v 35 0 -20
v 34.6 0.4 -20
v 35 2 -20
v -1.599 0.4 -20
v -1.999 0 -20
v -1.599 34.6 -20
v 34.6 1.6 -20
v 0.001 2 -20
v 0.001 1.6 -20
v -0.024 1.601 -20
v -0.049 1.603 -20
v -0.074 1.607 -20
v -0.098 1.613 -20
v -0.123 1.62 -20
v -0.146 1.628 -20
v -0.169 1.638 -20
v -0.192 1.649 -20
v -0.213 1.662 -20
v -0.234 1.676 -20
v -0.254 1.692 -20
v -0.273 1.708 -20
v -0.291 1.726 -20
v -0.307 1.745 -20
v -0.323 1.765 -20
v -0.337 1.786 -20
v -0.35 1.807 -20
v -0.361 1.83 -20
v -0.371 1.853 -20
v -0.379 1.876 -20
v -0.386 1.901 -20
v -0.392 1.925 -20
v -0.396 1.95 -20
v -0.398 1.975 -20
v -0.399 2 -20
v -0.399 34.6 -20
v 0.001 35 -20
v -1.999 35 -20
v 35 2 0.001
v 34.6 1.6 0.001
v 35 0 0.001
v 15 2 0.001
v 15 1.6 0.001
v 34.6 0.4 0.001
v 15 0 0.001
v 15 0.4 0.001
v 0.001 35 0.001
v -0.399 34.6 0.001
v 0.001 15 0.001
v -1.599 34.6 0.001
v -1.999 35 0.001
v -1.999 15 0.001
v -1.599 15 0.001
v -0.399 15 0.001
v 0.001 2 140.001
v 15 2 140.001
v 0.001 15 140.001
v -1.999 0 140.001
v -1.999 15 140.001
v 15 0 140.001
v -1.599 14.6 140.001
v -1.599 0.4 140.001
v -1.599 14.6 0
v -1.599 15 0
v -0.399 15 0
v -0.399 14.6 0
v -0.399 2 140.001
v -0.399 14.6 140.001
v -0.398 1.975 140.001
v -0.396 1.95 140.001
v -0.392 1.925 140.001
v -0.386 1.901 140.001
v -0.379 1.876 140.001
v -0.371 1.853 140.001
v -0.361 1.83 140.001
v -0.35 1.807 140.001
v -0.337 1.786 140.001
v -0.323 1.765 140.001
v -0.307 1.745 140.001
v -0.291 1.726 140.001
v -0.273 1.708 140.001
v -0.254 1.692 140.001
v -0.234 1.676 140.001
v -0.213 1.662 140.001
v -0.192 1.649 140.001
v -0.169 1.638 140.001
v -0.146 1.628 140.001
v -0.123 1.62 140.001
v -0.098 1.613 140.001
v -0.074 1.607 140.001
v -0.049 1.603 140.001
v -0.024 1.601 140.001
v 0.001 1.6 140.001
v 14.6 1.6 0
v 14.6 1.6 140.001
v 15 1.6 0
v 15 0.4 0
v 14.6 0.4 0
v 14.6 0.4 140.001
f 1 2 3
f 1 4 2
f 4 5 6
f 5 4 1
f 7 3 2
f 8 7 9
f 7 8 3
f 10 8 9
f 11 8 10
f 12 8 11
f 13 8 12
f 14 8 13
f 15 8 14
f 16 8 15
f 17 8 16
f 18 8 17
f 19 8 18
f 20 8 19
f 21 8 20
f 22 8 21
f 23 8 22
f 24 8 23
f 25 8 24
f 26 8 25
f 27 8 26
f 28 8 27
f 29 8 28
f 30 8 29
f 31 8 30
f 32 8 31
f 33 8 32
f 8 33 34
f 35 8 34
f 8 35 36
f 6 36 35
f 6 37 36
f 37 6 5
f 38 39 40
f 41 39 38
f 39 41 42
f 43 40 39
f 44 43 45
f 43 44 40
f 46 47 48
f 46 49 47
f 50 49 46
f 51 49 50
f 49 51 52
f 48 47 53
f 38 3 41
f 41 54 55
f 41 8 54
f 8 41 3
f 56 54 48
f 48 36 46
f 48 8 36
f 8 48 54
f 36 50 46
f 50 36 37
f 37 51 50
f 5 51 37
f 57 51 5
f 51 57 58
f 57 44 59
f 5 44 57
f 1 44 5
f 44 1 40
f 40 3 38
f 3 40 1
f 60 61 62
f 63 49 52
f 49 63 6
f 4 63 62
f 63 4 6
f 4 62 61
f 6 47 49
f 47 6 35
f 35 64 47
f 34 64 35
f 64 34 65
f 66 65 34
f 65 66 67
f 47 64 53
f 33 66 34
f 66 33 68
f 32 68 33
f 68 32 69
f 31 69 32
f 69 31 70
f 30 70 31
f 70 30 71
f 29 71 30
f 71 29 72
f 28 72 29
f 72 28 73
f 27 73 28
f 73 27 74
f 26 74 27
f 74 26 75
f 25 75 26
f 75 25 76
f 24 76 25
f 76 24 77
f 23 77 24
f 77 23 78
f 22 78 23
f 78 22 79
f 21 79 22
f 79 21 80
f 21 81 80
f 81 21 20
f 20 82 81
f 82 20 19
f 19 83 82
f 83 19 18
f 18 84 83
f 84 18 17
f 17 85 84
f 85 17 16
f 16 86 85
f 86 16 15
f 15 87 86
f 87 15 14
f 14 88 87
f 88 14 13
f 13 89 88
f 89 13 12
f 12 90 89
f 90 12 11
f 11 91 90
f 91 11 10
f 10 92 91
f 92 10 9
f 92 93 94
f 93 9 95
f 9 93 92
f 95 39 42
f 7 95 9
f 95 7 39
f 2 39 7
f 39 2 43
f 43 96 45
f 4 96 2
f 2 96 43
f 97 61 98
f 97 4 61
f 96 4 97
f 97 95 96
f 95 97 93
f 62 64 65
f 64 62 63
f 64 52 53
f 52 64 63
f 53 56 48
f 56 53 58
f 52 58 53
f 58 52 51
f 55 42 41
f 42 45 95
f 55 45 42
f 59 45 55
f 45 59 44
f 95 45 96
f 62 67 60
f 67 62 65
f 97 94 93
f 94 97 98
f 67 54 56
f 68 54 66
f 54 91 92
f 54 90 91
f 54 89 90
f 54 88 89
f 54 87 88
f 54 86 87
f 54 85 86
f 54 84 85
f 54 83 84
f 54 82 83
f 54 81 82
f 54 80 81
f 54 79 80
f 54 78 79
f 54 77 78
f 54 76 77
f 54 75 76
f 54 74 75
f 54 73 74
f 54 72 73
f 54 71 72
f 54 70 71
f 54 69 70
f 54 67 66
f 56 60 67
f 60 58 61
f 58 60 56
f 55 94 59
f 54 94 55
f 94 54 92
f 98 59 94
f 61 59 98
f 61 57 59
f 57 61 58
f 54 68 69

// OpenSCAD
$fn = 100;

// Fudge factor
e = 0.001;

module crossSec( h, w ){
	translate([e,0])
	rotate([0,0,90])
	square([h,w]);
	square([h,w]);
}


height = 15;
width = 2.0;
secLength = 80;
wallThickness =0.4;

tailHeight = 35;
tailDepth = 20;

// Outer shell
translate([0,0,-tailDepth])
linear_extrude(tailDepth+e)
difference(){
	crossSec( tailHeight, width );
	offset(-wallThickness)
	crossSec( tailHeight, width );
}

linear_extrude(secLength-tailDepth+e)
difference(){
	crossSec( height, width );
	offset(-wallThickness)
	crossSec( height, width );
}

translate([0,0,secLength-tailDepth])
linear_extrude(secLength+e)
difference(){
	crossSec( height, width );
	offset(-wallThickness)
	crossSec( height, width );
}

//union(){
//	translate([0,0,-tailDepth])
//	linear_extrude(tailDepth+e)
//	crossSec( tailHeight, width );

//	linear_extrude(secLength-tailDepth+e)
//	crossSec( height, width );

//	translate([0,0,secLength-tailDepth])
//	linear_extrude(secLength+e)
//	crossSec( height, width );
//}
